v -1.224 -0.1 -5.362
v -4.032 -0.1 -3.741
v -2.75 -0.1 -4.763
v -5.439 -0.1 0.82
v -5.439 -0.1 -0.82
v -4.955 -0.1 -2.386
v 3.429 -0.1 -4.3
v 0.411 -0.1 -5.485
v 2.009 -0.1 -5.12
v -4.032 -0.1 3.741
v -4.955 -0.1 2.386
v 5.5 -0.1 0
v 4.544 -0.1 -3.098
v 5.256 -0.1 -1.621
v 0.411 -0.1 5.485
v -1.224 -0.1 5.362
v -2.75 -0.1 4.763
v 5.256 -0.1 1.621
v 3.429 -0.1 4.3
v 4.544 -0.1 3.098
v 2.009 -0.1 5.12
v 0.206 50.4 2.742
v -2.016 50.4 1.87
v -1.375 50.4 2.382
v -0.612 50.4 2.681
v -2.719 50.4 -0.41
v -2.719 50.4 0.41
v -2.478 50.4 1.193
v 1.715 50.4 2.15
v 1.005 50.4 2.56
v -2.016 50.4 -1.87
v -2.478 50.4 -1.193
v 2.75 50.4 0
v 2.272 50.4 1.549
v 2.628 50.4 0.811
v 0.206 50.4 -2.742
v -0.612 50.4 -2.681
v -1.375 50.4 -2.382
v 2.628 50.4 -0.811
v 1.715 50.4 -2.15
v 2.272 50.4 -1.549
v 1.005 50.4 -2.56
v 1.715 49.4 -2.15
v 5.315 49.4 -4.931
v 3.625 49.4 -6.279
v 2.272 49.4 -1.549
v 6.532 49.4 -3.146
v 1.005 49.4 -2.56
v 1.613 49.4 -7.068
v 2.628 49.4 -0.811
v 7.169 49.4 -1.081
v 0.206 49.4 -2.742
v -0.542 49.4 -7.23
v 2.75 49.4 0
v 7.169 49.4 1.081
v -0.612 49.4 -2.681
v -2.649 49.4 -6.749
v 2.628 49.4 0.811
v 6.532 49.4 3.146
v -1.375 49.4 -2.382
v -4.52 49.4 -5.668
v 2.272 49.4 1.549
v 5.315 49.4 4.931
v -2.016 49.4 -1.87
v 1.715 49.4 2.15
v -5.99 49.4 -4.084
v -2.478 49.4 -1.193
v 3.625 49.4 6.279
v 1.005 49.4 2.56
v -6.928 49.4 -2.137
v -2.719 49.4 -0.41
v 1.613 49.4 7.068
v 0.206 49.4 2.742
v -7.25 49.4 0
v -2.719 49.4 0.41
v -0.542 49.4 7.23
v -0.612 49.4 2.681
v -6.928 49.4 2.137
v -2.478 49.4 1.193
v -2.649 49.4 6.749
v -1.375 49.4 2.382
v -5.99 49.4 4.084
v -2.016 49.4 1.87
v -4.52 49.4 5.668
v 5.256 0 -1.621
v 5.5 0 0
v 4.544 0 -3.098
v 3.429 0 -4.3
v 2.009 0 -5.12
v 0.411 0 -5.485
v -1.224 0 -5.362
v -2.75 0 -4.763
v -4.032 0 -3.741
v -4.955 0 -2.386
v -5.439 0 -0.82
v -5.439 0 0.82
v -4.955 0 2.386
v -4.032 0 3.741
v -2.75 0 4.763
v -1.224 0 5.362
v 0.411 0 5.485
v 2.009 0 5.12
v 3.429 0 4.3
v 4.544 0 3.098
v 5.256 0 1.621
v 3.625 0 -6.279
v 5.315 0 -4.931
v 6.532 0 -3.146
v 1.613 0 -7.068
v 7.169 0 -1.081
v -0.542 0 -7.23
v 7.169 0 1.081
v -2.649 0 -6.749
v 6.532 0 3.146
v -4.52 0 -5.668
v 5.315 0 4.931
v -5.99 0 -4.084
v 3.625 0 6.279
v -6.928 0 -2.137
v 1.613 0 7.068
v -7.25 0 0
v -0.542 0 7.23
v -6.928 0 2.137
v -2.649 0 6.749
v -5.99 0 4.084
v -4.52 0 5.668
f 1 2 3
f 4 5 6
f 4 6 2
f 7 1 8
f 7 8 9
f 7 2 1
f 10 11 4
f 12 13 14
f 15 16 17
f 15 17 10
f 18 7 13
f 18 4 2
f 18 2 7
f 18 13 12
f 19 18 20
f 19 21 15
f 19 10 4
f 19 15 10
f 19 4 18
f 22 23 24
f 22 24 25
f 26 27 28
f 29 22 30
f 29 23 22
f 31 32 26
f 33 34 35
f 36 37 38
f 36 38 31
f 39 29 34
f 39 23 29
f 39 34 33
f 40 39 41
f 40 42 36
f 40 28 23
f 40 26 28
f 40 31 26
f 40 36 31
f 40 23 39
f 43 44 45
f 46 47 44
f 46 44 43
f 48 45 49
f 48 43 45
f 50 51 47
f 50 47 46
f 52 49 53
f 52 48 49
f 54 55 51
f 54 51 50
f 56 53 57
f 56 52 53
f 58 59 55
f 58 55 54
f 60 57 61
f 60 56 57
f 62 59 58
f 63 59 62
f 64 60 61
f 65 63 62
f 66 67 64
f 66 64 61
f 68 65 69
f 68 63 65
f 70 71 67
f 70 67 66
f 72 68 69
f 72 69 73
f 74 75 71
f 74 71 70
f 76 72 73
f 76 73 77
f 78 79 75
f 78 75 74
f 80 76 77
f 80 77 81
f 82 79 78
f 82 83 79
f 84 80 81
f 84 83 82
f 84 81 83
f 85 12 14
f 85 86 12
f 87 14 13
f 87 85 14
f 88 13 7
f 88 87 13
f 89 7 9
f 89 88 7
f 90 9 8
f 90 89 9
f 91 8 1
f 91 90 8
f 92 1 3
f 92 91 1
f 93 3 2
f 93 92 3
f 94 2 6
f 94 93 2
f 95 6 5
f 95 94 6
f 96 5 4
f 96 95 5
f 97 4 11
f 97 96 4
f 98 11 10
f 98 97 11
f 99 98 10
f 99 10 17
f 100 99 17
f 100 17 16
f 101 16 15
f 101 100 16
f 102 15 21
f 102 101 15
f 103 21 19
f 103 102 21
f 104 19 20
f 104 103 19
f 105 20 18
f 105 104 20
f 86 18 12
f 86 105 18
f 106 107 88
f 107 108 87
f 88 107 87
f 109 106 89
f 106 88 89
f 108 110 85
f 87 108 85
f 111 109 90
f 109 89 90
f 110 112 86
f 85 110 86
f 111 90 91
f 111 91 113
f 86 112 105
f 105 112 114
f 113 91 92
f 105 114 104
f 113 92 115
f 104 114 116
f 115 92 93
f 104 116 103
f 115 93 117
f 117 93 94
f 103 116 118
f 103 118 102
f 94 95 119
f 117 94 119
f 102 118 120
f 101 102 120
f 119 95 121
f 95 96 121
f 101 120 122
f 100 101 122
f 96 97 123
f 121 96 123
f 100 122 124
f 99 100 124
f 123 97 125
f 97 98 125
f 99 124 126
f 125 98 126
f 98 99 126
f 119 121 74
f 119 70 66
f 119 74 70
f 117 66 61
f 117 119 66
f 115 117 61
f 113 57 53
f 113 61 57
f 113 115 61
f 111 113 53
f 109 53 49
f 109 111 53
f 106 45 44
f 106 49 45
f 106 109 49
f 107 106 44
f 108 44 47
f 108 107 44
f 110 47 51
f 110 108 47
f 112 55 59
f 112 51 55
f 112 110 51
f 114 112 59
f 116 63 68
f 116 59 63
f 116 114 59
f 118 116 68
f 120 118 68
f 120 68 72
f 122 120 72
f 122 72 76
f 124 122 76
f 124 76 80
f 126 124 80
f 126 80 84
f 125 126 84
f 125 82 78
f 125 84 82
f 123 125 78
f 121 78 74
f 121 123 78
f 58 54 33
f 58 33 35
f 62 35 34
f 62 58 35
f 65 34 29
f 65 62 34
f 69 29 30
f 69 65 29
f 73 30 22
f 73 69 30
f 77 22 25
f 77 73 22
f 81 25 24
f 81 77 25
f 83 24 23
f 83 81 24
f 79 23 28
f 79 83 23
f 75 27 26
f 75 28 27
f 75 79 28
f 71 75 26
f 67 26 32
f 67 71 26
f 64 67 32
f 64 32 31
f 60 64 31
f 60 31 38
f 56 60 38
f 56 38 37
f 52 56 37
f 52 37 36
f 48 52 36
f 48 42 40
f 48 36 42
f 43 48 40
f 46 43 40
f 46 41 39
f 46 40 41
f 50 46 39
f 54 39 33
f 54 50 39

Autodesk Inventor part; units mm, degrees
ref_plane "YZ Plane" through (0, 0, 0) normal (1, 0, 0) x (0, 1, 0)
ref_plane "XZ Plane" through (0, 0, 0) normal (0, 1, 0) x (-1, 0, 0)
ref_plane "XY Plane" through (0, 0, 0) normal (0, 0, 1) x (1, 0, 0)
sketch "Sketch1" plane through (0, 0, 0) normal (0, 1, 0) x (-1, 0, 0)
  circle A0 centre (0, 0) radius 7.25
  dimension "AABatteryDiameter" = 14.5
extrude "Extrusion1" add sketch "Sketch1" along normal blind 49.4
sketch "Sketch2" plane through (0, 49.4, 0) normal (0, 1, 0) x (1, 0, 0)
  circle A0 centre (0, 0) radius 7.25 projected
  circle A1 centre (0, 0) radius 2.75
  dimension "d3" = 5.5
extrude "Extrusion2" add sketch "Sketch2" along normal blind 1 contours A1
sketch "Sketch3" plane through (0, 0, 0) normal (0, -1, 0) x (1, 0, 0)
  circle A0 centre (0, 0) radius 7.25 projected
  circle A1 centre (0, 0) radius 5.5
  dimension "d6" = 11
extrude "Extrusion3" add sketch "Sketch3" along normal blind 0.1 contours A1
equation "\"AABatteryLength\" = d4 + d1 + d7"
equation "\"d4\" = 1"
equation "\"d1\" = 49.4"
equation "\"d7\" = 0.1"
properties part number "AABattery"
